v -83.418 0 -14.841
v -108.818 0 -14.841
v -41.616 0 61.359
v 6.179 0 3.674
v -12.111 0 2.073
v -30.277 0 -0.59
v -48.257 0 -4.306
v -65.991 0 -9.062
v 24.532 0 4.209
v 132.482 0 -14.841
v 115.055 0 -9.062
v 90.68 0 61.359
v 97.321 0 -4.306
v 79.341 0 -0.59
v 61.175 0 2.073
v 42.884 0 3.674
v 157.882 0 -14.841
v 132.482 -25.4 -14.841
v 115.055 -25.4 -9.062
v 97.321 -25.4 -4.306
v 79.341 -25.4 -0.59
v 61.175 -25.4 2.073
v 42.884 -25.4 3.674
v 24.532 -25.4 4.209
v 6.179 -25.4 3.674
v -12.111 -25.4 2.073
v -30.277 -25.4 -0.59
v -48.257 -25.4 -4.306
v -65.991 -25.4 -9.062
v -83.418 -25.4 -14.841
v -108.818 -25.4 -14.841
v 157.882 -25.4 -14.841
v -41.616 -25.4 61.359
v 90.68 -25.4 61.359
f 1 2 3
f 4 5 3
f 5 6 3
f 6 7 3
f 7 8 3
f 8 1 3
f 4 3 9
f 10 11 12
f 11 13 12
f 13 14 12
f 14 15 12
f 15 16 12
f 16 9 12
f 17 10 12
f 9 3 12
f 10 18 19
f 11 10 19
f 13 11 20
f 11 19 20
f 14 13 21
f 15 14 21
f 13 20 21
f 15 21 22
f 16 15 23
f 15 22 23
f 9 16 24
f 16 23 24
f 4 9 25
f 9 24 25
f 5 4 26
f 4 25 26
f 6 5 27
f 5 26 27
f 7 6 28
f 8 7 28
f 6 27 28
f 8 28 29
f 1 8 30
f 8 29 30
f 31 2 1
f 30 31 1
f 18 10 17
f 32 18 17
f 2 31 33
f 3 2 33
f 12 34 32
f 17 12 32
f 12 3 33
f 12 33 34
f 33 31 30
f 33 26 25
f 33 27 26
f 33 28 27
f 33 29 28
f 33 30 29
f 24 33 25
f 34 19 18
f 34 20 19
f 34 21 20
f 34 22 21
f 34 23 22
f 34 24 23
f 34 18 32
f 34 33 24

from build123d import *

# Parameters (mm, degrees)
F0_W     = 317.5
F0_H     = 76.2
F1_DEPTH = 25.4
F3_DEPTH = 50.8
F5_DEPTH = 508


with BuildPart() as f1:
    # F0 (on Front) → F1 (new body)
    with BuildSketch(Plane.XZ):
        with Locations((24.531897, 23.258603)):
            Rectangle(F0_W, F0_H)
    extrude(amount=F1_DEPTH)

    # F2 (on face) → F3 (cut)
    with BuildSketch(Plane.XZ.offset(25.4)):
        Polygon((-134.218103, -14.841397), (-108.818103, -14.841397), (-41.616019, 61.358603), (-134.218103, 61.358603), align=None)
        Polygon((90.679814, 61.358603), (157.881897, -14.841397), (183.281897, -14.841397), (183.281897, 61.358603), align=None)
    extrude(amount=-F3_DEPTH, mode=Mode.SUBTRACT)

    # F4 (on face) → F5 (cut)
    with BuildSketch(Plane.XZ.offset(25.4)):
        with BuildLine():
            Line((-83.418103, -14.841397), (132.481897, -14.841397))
            ThreePointArc((132.481897, -14.841397), (24.531897, 4.208603), (-83.418103, -14.841397))
        make_face()
    extrude(amount=-F5_DEPTH, mode=Mode.SUBTRACT)


solid = f1.part
